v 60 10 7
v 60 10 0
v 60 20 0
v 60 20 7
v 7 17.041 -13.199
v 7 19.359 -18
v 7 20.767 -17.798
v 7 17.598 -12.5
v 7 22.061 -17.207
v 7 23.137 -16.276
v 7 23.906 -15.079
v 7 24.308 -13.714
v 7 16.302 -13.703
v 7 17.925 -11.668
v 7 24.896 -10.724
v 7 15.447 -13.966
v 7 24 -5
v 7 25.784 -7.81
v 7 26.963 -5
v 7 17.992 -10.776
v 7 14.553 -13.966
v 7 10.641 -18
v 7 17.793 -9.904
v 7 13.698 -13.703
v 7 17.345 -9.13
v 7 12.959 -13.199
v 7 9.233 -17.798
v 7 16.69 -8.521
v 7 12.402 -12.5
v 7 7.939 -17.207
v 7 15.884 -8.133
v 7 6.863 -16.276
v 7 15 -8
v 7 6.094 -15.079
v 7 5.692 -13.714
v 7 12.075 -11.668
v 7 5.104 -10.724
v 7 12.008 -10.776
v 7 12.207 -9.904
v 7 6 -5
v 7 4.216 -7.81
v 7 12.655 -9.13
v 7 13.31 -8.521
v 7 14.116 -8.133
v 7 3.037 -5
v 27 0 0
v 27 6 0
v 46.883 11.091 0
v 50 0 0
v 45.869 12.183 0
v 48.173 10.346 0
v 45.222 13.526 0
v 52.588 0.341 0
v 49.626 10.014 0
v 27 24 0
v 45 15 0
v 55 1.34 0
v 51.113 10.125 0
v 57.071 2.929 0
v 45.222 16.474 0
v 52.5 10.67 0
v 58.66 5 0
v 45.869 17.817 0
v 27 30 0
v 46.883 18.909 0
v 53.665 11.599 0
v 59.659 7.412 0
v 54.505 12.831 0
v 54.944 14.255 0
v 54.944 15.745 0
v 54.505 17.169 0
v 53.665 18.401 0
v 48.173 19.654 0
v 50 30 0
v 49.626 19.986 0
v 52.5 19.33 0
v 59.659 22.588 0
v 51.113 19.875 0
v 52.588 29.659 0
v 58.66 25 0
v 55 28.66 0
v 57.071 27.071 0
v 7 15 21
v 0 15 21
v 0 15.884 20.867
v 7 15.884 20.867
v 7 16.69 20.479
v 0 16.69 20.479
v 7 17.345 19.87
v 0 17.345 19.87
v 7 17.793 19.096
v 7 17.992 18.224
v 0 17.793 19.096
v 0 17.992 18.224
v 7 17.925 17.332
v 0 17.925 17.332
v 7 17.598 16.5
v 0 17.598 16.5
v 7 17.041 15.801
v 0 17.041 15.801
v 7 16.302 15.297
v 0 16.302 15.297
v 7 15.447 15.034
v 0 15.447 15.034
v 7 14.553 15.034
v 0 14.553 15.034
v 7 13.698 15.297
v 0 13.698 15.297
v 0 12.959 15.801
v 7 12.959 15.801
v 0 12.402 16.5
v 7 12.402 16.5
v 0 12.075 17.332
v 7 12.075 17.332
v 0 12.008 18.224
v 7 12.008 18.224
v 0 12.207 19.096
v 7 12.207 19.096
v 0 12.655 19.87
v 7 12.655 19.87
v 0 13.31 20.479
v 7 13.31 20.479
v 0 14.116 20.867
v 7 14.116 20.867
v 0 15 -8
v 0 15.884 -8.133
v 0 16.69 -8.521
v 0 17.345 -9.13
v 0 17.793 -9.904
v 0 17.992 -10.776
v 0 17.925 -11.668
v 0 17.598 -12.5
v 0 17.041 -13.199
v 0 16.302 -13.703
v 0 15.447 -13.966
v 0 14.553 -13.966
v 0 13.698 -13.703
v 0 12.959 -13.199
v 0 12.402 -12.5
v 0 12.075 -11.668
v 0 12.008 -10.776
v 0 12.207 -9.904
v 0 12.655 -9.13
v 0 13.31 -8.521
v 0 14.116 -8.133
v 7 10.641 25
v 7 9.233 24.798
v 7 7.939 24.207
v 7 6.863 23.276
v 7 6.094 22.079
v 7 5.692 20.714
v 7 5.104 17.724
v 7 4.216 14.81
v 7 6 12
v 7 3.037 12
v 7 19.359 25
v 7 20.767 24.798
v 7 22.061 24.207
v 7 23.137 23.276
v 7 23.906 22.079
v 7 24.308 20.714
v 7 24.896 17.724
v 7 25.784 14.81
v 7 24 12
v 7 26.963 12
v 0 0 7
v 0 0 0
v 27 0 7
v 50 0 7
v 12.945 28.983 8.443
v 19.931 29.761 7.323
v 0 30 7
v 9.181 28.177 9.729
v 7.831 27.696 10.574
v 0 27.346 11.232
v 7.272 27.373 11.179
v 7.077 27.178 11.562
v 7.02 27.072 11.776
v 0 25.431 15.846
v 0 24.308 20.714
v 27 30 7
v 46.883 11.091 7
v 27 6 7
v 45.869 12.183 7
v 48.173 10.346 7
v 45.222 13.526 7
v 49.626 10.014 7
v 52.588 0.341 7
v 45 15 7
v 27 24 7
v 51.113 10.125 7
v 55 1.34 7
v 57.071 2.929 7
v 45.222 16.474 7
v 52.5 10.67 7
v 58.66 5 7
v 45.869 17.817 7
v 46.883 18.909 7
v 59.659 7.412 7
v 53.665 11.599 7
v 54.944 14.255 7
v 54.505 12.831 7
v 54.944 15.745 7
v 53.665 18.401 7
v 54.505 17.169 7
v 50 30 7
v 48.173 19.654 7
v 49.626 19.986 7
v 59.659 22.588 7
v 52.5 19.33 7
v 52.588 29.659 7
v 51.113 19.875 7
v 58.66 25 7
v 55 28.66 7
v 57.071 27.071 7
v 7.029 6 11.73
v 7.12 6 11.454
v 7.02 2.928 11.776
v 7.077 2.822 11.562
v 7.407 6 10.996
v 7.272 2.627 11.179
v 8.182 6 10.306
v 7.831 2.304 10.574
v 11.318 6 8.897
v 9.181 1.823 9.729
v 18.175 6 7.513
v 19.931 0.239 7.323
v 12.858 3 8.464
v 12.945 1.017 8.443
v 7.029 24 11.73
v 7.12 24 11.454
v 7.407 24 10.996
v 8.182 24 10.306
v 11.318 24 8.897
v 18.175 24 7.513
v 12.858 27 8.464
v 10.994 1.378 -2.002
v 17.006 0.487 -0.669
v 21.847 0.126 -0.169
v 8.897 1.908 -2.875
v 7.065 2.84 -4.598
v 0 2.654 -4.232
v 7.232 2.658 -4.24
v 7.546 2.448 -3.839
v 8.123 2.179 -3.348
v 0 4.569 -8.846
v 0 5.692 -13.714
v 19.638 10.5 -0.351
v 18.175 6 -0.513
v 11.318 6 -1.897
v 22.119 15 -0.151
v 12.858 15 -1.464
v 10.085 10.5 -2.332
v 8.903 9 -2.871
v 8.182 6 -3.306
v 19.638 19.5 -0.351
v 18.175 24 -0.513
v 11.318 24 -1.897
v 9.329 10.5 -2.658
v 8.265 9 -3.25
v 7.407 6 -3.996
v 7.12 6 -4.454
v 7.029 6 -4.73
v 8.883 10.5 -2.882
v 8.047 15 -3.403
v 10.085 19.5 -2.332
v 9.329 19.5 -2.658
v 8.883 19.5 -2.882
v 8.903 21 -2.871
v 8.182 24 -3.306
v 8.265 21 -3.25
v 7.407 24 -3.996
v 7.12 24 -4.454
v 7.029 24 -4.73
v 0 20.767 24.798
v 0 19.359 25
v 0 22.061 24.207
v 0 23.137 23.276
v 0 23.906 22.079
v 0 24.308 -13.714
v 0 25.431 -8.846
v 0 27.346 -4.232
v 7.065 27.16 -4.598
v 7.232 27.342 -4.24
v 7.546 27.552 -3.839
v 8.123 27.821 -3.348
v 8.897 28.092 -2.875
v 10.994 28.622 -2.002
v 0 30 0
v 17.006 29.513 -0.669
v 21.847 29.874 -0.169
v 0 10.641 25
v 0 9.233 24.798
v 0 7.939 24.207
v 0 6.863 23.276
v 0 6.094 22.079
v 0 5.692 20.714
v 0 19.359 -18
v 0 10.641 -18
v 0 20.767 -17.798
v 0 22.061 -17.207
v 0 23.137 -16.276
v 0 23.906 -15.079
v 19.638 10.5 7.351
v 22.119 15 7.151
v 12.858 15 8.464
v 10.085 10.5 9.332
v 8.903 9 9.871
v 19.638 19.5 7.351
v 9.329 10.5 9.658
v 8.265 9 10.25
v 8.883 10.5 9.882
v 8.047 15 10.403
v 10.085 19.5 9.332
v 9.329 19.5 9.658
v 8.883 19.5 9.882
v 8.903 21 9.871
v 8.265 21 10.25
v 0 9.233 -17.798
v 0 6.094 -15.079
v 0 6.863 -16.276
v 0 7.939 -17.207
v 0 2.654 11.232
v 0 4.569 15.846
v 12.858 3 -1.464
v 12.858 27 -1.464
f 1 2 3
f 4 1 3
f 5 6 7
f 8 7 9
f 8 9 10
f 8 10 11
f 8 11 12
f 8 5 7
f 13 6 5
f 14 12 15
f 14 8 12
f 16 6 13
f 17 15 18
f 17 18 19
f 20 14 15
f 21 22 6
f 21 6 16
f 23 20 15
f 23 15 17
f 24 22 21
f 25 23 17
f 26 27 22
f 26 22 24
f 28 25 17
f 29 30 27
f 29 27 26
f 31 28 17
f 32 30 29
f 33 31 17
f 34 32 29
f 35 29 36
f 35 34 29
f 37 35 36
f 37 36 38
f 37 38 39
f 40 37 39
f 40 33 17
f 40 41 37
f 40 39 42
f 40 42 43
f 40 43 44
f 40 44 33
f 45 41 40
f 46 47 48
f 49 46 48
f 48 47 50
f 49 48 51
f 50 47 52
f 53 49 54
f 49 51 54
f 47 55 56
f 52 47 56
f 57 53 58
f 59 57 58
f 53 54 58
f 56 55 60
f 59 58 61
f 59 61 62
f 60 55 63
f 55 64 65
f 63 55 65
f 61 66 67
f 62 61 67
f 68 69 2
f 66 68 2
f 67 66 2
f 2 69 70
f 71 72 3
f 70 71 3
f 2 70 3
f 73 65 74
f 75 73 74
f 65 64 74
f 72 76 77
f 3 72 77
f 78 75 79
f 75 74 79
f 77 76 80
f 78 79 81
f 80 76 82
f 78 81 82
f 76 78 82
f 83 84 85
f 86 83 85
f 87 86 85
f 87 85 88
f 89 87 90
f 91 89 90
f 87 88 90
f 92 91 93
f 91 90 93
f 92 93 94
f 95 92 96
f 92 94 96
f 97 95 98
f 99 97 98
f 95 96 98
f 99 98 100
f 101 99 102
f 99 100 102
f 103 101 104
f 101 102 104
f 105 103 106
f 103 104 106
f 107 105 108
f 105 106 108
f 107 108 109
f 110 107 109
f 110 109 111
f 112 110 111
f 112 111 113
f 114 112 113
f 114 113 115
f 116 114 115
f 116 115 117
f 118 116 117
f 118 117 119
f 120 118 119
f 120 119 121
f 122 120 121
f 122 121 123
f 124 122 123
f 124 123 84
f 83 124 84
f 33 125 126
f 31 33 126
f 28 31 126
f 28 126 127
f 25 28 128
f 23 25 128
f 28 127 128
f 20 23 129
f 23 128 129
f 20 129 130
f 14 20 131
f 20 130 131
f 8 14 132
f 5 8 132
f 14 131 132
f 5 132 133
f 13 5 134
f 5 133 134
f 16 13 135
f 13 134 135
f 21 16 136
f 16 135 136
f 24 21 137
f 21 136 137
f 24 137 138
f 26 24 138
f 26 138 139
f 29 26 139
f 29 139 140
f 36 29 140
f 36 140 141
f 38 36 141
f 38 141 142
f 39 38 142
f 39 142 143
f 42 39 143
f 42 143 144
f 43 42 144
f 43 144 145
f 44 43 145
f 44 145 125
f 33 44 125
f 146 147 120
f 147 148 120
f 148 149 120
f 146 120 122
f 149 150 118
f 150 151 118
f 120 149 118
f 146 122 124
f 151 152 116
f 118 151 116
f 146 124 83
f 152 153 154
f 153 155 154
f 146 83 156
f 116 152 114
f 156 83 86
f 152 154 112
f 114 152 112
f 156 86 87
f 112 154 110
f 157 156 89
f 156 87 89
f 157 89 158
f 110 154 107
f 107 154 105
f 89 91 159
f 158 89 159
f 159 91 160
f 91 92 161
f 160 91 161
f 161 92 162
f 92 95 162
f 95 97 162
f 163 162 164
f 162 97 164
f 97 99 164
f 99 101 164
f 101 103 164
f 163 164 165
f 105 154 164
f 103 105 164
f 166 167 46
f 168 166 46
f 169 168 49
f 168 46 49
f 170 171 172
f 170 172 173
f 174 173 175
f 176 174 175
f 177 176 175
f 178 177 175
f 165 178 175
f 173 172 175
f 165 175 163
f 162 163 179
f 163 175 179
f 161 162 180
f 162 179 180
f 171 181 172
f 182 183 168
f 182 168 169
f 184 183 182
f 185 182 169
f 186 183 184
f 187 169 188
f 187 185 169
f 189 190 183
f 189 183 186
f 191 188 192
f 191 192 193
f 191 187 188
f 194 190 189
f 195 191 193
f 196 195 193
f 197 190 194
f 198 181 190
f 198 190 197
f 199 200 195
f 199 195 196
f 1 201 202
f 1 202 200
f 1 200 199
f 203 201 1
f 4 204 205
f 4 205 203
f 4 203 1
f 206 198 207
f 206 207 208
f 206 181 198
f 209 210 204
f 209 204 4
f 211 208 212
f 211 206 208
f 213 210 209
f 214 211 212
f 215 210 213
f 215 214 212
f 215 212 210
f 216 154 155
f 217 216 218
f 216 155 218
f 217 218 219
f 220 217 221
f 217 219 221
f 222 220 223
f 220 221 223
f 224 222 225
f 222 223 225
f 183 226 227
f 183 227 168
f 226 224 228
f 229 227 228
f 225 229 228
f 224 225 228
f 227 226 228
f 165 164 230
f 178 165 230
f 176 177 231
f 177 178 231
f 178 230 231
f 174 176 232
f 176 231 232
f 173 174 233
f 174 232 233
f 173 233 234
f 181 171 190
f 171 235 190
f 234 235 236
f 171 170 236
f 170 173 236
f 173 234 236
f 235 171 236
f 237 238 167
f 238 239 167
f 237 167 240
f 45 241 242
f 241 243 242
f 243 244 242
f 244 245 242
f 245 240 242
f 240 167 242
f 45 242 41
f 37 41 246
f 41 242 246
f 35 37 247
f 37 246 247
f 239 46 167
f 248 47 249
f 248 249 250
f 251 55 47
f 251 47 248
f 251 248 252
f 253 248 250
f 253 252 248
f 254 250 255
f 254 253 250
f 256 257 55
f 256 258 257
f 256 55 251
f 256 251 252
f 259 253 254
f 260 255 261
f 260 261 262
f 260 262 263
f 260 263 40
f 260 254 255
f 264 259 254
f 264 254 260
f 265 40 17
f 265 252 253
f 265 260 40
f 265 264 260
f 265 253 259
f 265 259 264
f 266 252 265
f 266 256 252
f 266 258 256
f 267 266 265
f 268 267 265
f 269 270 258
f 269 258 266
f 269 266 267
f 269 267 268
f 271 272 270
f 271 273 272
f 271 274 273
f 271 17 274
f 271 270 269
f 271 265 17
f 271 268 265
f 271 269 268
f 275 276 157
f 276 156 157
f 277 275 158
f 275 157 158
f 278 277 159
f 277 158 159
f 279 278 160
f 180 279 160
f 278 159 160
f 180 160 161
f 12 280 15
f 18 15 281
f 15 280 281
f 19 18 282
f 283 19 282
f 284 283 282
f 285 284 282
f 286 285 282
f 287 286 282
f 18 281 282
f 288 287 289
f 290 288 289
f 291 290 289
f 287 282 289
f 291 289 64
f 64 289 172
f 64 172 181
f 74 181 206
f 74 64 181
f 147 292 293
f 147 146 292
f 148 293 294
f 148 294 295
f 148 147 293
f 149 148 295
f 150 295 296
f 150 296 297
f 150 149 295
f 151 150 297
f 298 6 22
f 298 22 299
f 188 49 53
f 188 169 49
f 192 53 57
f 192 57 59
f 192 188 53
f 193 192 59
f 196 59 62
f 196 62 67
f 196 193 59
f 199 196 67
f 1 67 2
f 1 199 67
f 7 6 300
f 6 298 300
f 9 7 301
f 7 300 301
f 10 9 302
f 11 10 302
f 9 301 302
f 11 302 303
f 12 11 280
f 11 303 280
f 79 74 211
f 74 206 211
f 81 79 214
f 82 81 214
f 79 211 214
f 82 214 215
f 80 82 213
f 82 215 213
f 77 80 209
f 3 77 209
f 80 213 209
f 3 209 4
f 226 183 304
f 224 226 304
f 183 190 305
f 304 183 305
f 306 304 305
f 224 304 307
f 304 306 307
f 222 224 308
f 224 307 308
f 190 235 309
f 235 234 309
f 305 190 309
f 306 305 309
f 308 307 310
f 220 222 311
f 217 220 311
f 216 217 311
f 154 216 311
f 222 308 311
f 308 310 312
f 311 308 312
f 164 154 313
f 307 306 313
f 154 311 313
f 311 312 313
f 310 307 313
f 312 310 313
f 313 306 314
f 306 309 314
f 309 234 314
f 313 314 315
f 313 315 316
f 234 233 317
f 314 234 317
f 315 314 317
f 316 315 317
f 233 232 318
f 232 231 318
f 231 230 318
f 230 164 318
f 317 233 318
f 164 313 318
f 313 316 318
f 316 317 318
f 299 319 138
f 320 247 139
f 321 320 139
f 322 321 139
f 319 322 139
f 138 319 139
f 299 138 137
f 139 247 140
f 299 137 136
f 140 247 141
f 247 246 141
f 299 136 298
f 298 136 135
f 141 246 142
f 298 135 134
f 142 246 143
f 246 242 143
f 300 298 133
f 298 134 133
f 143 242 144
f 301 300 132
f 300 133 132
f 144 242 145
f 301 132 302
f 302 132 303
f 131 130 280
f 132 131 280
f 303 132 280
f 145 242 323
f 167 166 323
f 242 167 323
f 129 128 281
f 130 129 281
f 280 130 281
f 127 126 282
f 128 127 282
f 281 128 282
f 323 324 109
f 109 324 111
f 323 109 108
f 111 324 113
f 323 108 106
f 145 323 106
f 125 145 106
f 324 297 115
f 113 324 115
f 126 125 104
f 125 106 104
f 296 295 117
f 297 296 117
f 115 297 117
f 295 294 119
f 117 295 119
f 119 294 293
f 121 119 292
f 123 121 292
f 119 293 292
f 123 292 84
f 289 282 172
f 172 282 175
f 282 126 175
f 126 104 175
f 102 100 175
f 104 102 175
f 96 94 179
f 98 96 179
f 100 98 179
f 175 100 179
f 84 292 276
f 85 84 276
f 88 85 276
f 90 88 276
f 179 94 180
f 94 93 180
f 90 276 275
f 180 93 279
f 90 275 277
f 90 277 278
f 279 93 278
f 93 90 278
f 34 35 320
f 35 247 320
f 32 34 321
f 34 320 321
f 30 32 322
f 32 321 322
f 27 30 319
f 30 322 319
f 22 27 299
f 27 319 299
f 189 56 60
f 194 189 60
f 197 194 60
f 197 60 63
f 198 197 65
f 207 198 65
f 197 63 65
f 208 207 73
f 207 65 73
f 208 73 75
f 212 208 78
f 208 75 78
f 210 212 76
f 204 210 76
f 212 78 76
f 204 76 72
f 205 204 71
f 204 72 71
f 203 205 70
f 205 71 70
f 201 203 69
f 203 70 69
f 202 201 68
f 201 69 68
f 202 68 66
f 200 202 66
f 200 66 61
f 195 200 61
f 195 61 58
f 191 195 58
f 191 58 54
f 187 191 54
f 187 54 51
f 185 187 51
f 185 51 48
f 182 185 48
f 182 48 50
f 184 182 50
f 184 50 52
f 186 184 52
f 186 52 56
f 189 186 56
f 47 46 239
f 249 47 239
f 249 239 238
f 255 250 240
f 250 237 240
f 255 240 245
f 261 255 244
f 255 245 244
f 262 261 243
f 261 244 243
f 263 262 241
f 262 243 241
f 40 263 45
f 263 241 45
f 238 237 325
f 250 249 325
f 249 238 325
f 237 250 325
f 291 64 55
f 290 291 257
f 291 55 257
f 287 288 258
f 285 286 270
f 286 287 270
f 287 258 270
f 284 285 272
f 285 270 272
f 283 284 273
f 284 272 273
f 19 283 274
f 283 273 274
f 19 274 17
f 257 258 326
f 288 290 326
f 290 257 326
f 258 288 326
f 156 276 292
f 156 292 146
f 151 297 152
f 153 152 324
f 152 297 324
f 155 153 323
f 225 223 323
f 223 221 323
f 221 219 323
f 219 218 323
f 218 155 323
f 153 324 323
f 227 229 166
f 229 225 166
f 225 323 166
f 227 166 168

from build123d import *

# Parameters (mm, degrees)
SKETCH_1_W          = 60
SKETCH_1_H          = 30
EXTRUDE_1_DEPTH     = 7
CUT_EXTRUDE_1_REACH = 69.446
SKETCH_2_R          = 5
SKETCH_3_W          = 7
SKETCH_3_H          = 18
EXTRUDE_2_DEPTH     = 18
SKETCH_4_W          = 7
SKETCH_4_H          = 18
EXTRUDE_3_DEPTH     = 18
CUT_EXTRUDE_2_REACH = 73.589
SKETCH_5_R          = 3
FILLET_2_SIZE       = 20
FILLET_2_SIZE_2     = 5
FILLET_3_DEPTH      = 27.0000001
FILLET_START        = -1
FILLET_3_2_DEPTH    = 32
FILLET_4_R          = 5
FILLET_5_R          = 5
FILLET_6_R          = 5
FILLET_7_R          = 5
FILLET_8_R          = 10


with BuildPart() as part:
    # 草图1 → 凸台-拉伸1 (new body)
    with BuildSketch(Plane.XY):
        with Locations((30, 15)):
            Rectangle(SKETCH_1_W, SKETCH_1_H)
    extrude(amount=EXTRUDE_1_DEPTH)

    # 草图2 → 切除-拉伸1 (cut, up to next)
    with BuildSketch(Plane(origin=(0, 0, 0), x_dir=(-1, 0, 0), z_dir=(0, 0, -1)), mode=Mode.PRIVATE) as cut_extrude_1_sk1:
        with Locations((-50, 15)):
            Circle(SKETCH_2_R)
    cut_extrude_1_tool1 = extrude(cut_extrude_1_sk1.sketch, amount=-CUT_EXTRUDE_1_REACH, mode=Mode.PRIVATE) & part.part
    add(cut_extrude_1_tool1.solids().sort_by_distance((50, 15, 0))[0], mode=Mode.SUBTRACT)

    # 草图3 → 凸台-拉伸2 (add)
    with BuildSketch(Plane.XY.offset(7)):
        with Locations((3.5, 15)):
            Rectangle(SKETCH_3_W, SKETCH_3_H)
    extrude(amount=EXTRUDE_2_DEPTH)

    # 草图4 → 凸台-拉伸3 (add)
    with BuildSketch(Plane(origin=(0, 0, 0), x_dir=(-1, 0, 0), z_dir=(0, 0, -1))):
        with Locations((-3.5, 15)):
            Rectangle(SKETCH_4_W, SKETCH_4_H)
    extrude(amount=EXTRUDE_3_DEPTH)

    # 草图5 → 切除-拉伸2 (cut, up to next)
    with BuildSketch(Plane.ZY, mode=Mode.PRIVATE) as cut_extrude_2_sk1:
        with Locations((-11, 15)):
            Circle(SKETCH_5_R)
    cut_extrude_2_tool1 = extrude(cut_extrude_2_sk1.sketch, amount=-CUT_EXTRUDE_2_REACH, mode=Mode.PRIVATE) & part.part
    # 草图5 → 切除-拉伸2 (cut, up to next)
    with BuildSketch(Plane.ZY, mode=Mode.PRIVATE) as cut_extrude_2_sk2:
        with Locations((18, 15)):
            Circle(SKETCH_5_R)
    cut_extrude_2_tool2 = extrude(cut_extrude_2_sk2.sketch, amount=-CUT_EXTRUDE_2_REACH, mode=Mode.PRIVATE) & part.part
    add(cut_extrude_2_tool1.solids().sort_by_distance((0, 15, -11))[0], mode=Mode.SUBTRACT)
    add(cut_extrude_2_tool2.solids().sort_by_distance((0, 15, 18))[0], mode=Mode.SUBTRACT)

    # 圆角2
    # a fillet whose section is not a circle: 20, 5 mm, written as the material it adds along each edge
    with BuildSketch(Plane(origin=(7, 24, 7), x_dir=(1, 0, 0), z_dir=(0, -1, 0))) as fillet_2_piece_1:
        with BuildLine():
            Bezier((FILLET_2_SIZE, 0), (0, 0), (0, FILLET_2_SIZE_2), weights=[1, 0.707106781, 1])
            Line((0, FILLET_2_SIZE_2), (0, 0))
            Line((0, 0), (FILLET_2_SIZE, 0))
        make_face()
    extrude(amount=18)
    with BuildSketch(Plane(origin=(7, 24, 0), x_dir=(1, 0, 0), z_dir=(0, -1, 0))) as fillet_2_piece_2:
        with BuildLine():
            Bezier((FILLET_2_SIZE, 0), (0, 0), (0, -FILLET_2_SIZE_2), weights=[1, 0.707106781, 1])
            Line((0, -FILLET_2_SIZE_2), (0, 0))
            Line((0, 0), (FILLET_2_SIZE, 0))
        make_face()
    extrude(amount=18)

    # 圆角3: read off the stored shape, not the designer's step
    # 圆角3 outline → 圆角3 (add)
    with BuildSketch(Plane.YZ):
        with BuildLine():
            Line((24, 25), (24, 7))
            Line((24, 7), (30, 7))
            ThreePointArc((30, 7), (25.539501058, 15.513167019), (24, 25))
        make_face()
        with BuildLine():
            ThreePointArc((6, 25), (4.460498942, 15.513167019), (0, 7))
            Line((0, 7), (6, 7))
            Line((6, 7), (6, 25))
        make_face()
        with BuildLine():
            Line((24, 0), (24, -18))
            ThreePointArc((24, -18), (25.539501058, -8.513167019), (30, 0))
            Line((30, 0), (24, 0))
        make_face()
        with BuildLine():
            Line((6, -18), (6, 0))
            Line((6, 0), (0, 0))
            ThreePointArc((0, 0), (4.460498942, -8.513167019), (6, -18))
        make_face()
    extrude(amount=FILLET_3_DEPTH)

    # Fillet 3 2 outline → Fillet 3 2 (cut)
    with BuildSketch(Plane(origin=(0, 0, 0), x_dir=(1, 0, 0), z_dir=(0, 1, 0)).offset(FILLET_START)):
        with BuildLine():
            add(Edge.make_bspline(
                [(7, -12), (7, -7), (27, -7)],
                knots=[0, 0, 0, 1, 1, 1], degree=2, weights=[1, 0.707106781, 1]))
            Line((7, -12), (7, -25))
            Line((7, -25), (27.0000001, -25))
            Line((27.0000001, -25), (27, -7))
        make_face()
        with BuildLine():
            Line((27.0000001, 18), (7, 18))
            Line((7, 18), (7, 5))
            add(Edge.make_bspline(
                [(27, 0), (7, 0), (7, 5)],
                knots=[0, 0, 0, 1, 1, 1], degree=2, weights=[1, 0.707106781, 1]))
            Line((27, 0), (27.0000001, 18))
        make_face()
    extrude(amount=FILLET_3_2_DEPTH, mode=Mode.SUBTRACT)

    # 圆角4
    fillet_4_edges = [part.edges().sort_by_distance(p)[0] for p in [
        (3.5, 24, 25),
    ]]
    fillet(fillet_4_edges, radius=FILLET_4_R)

    # 圆角5
    fillet_5_edges = [part.edges().sort_by_distance(p)[0] for p in [
        (3.5, 6, 25),
    ]]
    fillet(fillet_5_edges, radius=FILLET_5_R)

    # 圆角6
    fillet_6_edges = [part.edges().sort_by_distance(p)[0] for p in [
        (3.5, 6, -18),
    ]]
    fillet(fillet_6_edges, radius=FILLET_6_R)

    # 圆角7
    fillet_7_edges = [part.edges().sort_by_distance(p)[0] for p in [
        (3.5, 24, -18),
    ]]
    fillet(fillet_7_edges, radius=FILLET_7_R)

    # 圆角8
    fillet_8_edges = [part.edges().sort_by_distance(p)[0] for p in [
        (60, 0, 3.5),
        (60, 30, 3.5),
    ]]
    fillet(fillet_8_edges, radius=FILLET_8_R)


solid = part.part
